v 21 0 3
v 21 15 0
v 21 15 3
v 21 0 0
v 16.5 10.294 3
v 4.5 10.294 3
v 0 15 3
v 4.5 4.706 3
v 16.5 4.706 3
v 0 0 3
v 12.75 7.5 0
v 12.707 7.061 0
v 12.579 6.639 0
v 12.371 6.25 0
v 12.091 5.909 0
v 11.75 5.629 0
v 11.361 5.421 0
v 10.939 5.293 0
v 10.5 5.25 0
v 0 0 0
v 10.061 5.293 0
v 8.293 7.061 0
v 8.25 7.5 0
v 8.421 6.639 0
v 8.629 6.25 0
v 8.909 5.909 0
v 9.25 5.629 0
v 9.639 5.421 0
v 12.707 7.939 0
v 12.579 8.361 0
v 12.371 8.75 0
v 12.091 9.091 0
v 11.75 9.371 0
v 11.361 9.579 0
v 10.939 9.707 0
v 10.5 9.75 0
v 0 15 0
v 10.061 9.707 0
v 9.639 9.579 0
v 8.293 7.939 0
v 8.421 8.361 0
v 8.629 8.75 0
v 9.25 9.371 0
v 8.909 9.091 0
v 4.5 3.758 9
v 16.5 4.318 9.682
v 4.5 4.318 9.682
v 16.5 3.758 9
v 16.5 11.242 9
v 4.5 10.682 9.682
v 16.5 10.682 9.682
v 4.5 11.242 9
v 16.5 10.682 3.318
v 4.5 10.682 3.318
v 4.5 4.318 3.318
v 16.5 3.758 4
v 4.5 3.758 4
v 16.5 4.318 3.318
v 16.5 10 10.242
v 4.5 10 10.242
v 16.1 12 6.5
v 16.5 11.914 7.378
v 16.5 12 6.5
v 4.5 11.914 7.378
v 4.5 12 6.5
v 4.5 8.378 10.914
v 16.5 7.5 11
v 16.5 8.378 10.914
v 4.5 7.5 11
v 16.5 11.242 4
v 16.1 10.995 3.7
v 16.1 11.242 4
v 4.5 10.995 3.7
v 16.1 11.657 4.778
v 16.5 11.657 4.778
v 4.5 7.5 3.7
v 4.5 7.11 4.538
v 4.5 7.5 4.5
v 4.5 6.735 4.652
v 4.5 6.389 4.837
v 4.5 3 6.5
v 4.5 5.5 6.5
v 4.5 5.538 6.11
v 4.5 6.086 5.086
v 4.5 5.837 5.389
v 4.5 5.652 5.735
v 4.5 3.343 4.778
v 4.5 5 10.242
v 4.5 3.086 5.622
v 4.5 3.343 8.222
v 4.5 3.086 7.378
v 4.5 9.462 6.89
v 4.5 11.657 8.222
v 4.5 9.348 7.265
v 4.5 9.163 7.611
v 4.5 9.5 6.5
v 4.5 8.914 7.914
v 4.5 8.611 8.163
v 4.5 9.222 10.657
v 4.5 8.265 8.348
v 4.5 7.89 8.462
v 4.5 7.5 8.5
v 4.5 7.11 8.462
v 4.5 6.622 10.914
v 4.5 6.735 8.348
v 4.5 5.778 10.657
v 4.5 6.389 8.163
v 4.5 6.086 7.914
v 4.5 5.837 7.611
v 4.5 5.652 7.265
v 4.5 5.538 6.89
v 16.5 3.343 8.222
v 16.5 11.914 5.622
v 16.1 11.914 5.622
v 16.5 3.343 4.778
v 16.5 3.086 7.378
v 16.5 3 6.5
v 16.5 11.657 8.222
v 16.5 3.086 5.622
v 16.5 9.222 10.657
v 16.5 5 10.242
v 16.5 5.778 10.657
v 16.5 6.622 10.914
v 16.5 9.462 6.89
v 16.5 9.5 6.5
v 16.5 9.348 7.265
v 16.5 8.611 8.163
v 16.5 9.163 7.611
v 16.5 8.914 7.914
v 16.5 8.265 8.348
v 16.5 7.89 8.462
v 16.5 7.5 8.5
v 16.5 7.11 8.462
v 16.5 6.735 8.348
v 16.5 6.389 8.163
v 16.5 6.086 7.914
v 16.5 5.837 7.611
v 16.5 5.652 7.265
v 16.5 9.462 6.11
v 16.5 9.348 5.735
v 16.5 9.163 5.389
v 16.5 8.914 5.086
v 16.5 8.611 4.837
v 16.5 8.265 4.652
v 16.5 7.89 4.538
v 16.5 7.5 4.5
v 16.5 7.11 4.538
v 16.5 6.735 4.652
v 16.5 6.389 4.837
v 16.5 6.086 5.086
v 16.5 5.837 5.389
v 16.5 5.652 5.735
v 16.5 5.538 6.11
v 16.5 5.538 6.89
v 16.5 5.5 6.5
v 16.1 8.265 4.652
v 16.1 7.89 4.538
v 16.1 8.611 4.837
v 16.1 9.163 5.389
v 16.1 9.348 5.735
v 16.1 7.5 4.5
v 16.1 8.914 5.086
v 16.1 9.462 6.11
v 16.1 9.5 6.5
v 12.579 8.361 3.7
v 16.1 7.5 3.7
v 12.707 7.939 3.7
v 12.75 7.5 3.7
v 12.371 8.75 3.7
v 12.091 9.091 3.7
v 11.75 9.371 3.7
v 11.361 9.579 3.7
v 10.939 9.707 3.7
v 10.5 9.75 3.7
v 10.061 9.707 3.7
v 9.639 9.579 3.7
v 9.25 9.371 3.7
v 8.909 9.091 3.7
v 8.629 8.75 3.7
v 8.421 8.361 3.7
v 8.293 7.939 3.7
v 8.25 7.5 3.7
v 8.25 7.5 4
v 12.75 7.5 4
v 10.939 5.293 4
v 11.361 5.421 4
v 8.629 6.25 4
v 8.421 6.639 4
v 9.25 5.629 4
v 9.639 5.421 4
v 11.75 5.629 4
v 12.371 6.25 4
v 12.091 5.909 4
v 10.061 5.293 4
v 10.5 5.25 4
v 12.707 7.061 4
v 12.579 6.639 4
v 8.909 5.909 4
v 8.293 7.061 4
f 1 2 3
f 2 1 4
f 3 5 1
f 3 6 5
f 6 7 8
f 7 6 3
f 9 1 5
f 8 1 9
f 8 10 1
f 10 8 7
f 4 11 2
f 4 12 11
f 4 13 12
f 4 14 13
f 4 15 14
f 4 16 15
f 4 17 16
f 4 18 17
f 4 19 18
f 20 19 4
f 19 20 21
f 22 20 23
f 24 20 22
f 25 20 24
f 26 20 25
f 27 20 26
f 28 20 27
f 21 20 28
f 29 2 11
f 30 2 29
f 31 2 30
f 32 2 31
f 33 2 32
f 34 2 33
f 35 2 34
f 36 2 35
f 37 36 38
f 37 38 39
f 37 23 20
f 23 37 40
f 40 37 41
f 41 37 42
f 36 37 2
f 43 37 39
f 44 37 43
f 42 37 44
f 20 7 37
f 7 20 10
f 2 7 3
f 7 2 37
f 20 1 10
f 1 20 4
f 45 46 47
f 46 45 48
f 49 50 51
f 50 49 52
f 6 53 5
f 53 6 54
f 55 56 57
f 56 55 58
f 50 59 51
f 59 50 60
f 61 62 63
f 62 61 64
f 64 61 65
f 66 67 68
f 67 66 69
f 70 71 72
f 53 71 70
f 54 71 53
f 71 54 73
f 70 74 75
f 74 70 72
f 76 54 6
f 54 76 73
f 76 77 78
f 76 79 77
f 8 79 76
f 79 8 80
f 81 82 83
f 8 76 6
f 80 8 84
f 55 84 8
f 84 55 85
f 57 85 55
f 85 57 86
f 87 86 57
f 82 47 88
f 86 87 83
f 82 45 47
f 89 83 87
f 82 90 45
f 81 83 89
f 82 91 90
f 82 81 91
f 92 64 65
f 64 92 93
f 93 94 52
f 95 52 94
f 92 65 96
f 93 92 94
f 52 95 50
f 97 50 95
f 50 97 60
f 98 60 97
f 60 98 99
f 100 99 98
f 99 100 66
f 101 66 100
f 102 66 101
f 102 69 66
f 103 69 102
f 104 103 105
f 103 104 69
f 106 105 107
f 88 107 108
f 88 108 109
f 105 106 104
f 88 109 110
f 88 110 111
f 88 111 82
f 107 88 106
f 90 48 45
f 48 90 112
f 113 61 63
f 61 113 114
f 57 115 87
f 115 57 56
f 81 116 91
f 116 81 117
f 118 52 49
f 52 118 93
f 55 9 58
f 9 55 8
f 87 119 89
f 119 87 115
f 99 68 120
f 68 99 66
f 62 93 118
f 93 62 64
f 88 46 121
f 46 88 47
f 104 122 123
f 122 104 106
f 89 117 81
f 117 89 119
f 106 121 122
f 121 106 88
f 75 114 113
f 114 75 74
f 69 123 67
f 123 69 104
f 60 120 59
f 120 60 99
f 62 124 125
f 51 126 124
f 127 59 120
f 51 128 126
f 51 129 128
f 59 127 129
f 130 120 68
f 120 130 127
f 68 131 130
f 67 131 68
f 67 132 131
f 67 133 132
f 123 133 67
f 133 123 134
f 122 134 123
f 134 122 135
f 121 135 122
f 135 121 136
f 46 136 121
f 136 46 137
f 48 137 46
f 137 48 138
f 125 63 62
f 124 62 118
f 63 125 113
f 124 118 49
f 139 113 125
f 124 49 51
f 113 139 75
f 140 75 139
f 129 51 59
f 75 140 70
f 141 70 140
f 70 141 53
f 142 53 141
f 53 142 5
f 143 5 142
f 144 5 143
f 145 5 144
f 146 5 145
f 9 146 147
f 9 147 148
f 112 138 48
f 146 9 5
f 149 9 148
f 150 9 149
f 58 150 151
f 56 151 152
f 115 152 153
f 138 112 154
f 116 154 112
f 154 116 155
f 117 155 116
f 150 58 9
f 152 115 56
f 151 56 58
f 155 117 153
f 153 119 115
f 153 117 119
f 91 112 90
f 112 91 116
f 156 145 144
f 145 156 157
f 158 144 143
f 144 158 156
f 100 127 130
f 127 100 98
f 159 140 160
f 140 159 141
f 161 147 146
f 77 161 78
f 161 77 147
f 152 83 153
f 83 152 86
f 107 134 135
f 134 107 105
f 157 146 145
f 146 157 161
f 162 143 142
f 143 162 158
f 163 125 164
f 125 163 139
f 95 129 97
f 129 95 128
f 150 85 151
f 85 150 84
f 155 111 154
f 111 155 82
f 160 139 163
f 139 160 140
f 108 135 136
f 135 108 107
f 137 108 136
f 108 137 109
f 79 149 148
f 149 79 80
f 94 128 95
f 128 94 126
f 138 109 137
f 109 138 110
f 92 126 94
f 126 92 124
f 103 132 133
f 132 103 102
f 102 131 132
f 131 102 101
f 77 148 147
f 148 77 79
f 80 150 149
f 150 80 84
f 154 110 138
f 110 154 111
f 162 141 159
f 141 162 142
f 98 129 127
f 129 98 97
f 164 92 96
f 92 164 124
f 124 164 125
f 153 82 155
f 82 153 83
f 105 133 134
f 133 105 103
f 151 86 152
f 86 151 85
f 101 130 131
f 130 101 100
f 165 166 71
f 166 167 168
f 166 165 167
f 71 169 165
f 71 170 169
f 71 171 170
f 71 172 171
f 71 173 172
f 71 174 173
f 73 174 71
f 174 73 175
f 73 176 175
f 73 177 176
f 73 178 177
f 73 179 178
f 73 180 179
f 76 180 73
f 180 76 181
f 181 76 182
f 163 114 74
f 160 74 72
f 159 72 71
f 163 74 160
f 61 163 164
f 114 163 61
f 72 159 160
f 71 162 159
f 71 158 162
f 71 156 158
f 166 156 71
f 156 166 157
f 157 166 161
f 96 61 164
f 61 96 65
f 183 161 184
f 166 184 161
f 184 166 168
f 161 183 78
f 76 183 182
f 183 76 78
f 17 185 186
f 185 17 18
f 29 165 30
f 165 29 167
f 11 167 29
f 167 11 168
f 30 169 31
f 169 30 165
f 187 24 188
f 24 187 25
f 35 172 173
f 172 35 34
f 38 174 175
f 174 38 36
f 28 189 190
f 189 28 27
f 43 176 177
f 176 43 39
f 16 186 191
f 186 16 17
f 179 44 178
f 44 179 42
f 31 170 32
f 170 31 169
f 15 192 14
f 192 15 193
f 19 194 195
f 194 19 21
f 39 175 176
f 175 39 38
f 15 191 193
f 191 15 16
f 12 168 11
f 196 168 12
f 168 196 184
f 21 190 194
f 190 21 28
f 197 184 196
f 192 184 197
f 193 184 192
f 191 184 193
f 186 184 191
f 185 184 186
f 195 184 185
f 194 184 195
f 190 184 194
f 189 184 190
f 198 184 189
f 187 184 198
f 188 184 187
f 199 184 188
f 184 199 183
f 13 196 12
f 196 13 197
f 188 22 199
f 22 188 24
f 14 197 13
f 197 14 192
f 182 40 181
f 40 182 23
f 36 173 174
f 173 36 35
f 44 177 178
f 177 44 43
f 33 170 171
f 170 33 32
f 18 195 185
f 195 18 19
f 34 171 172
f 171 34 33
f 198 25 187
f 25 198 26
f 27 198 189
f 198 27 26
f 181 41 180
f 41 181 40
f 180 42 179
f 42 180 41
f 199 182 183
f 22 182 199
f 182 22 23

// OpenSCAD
$fn = 32;

// ----------------------------------------------------------------------
// Cable clip: cable 4 mm, clamp 9 mm, base 21 mm
// ----------------------------------------------------------------------

// --- parameters (mm) ---
base_w = 21;              // base length, X
base_d = 15;              // base width, Y
base_t = 3;               // base thickness
clamp_d = 9;              // clamp outside diameter
wall_t = 2.5;             // clamp wall
cable_d = 4;              // cable opening
ring_w = 12;              // clamp width along the cable
screw_d = 4.5;            // screw clearance
throat = 2.8;             // snap throat width
sink = 1;                 // overlap of the clamp into the base

module base() {
  cube([base_w, base_d, base_t]);
}

module clamp() {
  translate([base_w / 2, base_d / 2, base_t + clamp_d / 2 - sink]) rotate([0, 90, 0])
    cylinder(h = ring_w, d = clamp_d, center = true);
}

difference() {
  union() {
    base();
    clamp();
  }
  translate([base_w / 2, base_d / 2, base_t + clamp_d / 2 - sink]) rotate([0, 90, 0]) translate([0, 0, -ring_w / 2 - 1]) cylinder(h = ring_w + 2, d = cable_d);
  /* snap throat: the opening is narrower than the cable */
  translate([base_w / 2 - throat / 2, base_d / 2, base_t + clamp_d / 2 - sink]) rotate([0, 90, 0]) translate([0, 0, -ring_w / 2 - 1]) cube([throat, clamp_d + 2, ring_w + 2]);
  translate([10.5, base_d / 2, -1]) cylinder(h = base_t + 2, d = screw_d);
}
